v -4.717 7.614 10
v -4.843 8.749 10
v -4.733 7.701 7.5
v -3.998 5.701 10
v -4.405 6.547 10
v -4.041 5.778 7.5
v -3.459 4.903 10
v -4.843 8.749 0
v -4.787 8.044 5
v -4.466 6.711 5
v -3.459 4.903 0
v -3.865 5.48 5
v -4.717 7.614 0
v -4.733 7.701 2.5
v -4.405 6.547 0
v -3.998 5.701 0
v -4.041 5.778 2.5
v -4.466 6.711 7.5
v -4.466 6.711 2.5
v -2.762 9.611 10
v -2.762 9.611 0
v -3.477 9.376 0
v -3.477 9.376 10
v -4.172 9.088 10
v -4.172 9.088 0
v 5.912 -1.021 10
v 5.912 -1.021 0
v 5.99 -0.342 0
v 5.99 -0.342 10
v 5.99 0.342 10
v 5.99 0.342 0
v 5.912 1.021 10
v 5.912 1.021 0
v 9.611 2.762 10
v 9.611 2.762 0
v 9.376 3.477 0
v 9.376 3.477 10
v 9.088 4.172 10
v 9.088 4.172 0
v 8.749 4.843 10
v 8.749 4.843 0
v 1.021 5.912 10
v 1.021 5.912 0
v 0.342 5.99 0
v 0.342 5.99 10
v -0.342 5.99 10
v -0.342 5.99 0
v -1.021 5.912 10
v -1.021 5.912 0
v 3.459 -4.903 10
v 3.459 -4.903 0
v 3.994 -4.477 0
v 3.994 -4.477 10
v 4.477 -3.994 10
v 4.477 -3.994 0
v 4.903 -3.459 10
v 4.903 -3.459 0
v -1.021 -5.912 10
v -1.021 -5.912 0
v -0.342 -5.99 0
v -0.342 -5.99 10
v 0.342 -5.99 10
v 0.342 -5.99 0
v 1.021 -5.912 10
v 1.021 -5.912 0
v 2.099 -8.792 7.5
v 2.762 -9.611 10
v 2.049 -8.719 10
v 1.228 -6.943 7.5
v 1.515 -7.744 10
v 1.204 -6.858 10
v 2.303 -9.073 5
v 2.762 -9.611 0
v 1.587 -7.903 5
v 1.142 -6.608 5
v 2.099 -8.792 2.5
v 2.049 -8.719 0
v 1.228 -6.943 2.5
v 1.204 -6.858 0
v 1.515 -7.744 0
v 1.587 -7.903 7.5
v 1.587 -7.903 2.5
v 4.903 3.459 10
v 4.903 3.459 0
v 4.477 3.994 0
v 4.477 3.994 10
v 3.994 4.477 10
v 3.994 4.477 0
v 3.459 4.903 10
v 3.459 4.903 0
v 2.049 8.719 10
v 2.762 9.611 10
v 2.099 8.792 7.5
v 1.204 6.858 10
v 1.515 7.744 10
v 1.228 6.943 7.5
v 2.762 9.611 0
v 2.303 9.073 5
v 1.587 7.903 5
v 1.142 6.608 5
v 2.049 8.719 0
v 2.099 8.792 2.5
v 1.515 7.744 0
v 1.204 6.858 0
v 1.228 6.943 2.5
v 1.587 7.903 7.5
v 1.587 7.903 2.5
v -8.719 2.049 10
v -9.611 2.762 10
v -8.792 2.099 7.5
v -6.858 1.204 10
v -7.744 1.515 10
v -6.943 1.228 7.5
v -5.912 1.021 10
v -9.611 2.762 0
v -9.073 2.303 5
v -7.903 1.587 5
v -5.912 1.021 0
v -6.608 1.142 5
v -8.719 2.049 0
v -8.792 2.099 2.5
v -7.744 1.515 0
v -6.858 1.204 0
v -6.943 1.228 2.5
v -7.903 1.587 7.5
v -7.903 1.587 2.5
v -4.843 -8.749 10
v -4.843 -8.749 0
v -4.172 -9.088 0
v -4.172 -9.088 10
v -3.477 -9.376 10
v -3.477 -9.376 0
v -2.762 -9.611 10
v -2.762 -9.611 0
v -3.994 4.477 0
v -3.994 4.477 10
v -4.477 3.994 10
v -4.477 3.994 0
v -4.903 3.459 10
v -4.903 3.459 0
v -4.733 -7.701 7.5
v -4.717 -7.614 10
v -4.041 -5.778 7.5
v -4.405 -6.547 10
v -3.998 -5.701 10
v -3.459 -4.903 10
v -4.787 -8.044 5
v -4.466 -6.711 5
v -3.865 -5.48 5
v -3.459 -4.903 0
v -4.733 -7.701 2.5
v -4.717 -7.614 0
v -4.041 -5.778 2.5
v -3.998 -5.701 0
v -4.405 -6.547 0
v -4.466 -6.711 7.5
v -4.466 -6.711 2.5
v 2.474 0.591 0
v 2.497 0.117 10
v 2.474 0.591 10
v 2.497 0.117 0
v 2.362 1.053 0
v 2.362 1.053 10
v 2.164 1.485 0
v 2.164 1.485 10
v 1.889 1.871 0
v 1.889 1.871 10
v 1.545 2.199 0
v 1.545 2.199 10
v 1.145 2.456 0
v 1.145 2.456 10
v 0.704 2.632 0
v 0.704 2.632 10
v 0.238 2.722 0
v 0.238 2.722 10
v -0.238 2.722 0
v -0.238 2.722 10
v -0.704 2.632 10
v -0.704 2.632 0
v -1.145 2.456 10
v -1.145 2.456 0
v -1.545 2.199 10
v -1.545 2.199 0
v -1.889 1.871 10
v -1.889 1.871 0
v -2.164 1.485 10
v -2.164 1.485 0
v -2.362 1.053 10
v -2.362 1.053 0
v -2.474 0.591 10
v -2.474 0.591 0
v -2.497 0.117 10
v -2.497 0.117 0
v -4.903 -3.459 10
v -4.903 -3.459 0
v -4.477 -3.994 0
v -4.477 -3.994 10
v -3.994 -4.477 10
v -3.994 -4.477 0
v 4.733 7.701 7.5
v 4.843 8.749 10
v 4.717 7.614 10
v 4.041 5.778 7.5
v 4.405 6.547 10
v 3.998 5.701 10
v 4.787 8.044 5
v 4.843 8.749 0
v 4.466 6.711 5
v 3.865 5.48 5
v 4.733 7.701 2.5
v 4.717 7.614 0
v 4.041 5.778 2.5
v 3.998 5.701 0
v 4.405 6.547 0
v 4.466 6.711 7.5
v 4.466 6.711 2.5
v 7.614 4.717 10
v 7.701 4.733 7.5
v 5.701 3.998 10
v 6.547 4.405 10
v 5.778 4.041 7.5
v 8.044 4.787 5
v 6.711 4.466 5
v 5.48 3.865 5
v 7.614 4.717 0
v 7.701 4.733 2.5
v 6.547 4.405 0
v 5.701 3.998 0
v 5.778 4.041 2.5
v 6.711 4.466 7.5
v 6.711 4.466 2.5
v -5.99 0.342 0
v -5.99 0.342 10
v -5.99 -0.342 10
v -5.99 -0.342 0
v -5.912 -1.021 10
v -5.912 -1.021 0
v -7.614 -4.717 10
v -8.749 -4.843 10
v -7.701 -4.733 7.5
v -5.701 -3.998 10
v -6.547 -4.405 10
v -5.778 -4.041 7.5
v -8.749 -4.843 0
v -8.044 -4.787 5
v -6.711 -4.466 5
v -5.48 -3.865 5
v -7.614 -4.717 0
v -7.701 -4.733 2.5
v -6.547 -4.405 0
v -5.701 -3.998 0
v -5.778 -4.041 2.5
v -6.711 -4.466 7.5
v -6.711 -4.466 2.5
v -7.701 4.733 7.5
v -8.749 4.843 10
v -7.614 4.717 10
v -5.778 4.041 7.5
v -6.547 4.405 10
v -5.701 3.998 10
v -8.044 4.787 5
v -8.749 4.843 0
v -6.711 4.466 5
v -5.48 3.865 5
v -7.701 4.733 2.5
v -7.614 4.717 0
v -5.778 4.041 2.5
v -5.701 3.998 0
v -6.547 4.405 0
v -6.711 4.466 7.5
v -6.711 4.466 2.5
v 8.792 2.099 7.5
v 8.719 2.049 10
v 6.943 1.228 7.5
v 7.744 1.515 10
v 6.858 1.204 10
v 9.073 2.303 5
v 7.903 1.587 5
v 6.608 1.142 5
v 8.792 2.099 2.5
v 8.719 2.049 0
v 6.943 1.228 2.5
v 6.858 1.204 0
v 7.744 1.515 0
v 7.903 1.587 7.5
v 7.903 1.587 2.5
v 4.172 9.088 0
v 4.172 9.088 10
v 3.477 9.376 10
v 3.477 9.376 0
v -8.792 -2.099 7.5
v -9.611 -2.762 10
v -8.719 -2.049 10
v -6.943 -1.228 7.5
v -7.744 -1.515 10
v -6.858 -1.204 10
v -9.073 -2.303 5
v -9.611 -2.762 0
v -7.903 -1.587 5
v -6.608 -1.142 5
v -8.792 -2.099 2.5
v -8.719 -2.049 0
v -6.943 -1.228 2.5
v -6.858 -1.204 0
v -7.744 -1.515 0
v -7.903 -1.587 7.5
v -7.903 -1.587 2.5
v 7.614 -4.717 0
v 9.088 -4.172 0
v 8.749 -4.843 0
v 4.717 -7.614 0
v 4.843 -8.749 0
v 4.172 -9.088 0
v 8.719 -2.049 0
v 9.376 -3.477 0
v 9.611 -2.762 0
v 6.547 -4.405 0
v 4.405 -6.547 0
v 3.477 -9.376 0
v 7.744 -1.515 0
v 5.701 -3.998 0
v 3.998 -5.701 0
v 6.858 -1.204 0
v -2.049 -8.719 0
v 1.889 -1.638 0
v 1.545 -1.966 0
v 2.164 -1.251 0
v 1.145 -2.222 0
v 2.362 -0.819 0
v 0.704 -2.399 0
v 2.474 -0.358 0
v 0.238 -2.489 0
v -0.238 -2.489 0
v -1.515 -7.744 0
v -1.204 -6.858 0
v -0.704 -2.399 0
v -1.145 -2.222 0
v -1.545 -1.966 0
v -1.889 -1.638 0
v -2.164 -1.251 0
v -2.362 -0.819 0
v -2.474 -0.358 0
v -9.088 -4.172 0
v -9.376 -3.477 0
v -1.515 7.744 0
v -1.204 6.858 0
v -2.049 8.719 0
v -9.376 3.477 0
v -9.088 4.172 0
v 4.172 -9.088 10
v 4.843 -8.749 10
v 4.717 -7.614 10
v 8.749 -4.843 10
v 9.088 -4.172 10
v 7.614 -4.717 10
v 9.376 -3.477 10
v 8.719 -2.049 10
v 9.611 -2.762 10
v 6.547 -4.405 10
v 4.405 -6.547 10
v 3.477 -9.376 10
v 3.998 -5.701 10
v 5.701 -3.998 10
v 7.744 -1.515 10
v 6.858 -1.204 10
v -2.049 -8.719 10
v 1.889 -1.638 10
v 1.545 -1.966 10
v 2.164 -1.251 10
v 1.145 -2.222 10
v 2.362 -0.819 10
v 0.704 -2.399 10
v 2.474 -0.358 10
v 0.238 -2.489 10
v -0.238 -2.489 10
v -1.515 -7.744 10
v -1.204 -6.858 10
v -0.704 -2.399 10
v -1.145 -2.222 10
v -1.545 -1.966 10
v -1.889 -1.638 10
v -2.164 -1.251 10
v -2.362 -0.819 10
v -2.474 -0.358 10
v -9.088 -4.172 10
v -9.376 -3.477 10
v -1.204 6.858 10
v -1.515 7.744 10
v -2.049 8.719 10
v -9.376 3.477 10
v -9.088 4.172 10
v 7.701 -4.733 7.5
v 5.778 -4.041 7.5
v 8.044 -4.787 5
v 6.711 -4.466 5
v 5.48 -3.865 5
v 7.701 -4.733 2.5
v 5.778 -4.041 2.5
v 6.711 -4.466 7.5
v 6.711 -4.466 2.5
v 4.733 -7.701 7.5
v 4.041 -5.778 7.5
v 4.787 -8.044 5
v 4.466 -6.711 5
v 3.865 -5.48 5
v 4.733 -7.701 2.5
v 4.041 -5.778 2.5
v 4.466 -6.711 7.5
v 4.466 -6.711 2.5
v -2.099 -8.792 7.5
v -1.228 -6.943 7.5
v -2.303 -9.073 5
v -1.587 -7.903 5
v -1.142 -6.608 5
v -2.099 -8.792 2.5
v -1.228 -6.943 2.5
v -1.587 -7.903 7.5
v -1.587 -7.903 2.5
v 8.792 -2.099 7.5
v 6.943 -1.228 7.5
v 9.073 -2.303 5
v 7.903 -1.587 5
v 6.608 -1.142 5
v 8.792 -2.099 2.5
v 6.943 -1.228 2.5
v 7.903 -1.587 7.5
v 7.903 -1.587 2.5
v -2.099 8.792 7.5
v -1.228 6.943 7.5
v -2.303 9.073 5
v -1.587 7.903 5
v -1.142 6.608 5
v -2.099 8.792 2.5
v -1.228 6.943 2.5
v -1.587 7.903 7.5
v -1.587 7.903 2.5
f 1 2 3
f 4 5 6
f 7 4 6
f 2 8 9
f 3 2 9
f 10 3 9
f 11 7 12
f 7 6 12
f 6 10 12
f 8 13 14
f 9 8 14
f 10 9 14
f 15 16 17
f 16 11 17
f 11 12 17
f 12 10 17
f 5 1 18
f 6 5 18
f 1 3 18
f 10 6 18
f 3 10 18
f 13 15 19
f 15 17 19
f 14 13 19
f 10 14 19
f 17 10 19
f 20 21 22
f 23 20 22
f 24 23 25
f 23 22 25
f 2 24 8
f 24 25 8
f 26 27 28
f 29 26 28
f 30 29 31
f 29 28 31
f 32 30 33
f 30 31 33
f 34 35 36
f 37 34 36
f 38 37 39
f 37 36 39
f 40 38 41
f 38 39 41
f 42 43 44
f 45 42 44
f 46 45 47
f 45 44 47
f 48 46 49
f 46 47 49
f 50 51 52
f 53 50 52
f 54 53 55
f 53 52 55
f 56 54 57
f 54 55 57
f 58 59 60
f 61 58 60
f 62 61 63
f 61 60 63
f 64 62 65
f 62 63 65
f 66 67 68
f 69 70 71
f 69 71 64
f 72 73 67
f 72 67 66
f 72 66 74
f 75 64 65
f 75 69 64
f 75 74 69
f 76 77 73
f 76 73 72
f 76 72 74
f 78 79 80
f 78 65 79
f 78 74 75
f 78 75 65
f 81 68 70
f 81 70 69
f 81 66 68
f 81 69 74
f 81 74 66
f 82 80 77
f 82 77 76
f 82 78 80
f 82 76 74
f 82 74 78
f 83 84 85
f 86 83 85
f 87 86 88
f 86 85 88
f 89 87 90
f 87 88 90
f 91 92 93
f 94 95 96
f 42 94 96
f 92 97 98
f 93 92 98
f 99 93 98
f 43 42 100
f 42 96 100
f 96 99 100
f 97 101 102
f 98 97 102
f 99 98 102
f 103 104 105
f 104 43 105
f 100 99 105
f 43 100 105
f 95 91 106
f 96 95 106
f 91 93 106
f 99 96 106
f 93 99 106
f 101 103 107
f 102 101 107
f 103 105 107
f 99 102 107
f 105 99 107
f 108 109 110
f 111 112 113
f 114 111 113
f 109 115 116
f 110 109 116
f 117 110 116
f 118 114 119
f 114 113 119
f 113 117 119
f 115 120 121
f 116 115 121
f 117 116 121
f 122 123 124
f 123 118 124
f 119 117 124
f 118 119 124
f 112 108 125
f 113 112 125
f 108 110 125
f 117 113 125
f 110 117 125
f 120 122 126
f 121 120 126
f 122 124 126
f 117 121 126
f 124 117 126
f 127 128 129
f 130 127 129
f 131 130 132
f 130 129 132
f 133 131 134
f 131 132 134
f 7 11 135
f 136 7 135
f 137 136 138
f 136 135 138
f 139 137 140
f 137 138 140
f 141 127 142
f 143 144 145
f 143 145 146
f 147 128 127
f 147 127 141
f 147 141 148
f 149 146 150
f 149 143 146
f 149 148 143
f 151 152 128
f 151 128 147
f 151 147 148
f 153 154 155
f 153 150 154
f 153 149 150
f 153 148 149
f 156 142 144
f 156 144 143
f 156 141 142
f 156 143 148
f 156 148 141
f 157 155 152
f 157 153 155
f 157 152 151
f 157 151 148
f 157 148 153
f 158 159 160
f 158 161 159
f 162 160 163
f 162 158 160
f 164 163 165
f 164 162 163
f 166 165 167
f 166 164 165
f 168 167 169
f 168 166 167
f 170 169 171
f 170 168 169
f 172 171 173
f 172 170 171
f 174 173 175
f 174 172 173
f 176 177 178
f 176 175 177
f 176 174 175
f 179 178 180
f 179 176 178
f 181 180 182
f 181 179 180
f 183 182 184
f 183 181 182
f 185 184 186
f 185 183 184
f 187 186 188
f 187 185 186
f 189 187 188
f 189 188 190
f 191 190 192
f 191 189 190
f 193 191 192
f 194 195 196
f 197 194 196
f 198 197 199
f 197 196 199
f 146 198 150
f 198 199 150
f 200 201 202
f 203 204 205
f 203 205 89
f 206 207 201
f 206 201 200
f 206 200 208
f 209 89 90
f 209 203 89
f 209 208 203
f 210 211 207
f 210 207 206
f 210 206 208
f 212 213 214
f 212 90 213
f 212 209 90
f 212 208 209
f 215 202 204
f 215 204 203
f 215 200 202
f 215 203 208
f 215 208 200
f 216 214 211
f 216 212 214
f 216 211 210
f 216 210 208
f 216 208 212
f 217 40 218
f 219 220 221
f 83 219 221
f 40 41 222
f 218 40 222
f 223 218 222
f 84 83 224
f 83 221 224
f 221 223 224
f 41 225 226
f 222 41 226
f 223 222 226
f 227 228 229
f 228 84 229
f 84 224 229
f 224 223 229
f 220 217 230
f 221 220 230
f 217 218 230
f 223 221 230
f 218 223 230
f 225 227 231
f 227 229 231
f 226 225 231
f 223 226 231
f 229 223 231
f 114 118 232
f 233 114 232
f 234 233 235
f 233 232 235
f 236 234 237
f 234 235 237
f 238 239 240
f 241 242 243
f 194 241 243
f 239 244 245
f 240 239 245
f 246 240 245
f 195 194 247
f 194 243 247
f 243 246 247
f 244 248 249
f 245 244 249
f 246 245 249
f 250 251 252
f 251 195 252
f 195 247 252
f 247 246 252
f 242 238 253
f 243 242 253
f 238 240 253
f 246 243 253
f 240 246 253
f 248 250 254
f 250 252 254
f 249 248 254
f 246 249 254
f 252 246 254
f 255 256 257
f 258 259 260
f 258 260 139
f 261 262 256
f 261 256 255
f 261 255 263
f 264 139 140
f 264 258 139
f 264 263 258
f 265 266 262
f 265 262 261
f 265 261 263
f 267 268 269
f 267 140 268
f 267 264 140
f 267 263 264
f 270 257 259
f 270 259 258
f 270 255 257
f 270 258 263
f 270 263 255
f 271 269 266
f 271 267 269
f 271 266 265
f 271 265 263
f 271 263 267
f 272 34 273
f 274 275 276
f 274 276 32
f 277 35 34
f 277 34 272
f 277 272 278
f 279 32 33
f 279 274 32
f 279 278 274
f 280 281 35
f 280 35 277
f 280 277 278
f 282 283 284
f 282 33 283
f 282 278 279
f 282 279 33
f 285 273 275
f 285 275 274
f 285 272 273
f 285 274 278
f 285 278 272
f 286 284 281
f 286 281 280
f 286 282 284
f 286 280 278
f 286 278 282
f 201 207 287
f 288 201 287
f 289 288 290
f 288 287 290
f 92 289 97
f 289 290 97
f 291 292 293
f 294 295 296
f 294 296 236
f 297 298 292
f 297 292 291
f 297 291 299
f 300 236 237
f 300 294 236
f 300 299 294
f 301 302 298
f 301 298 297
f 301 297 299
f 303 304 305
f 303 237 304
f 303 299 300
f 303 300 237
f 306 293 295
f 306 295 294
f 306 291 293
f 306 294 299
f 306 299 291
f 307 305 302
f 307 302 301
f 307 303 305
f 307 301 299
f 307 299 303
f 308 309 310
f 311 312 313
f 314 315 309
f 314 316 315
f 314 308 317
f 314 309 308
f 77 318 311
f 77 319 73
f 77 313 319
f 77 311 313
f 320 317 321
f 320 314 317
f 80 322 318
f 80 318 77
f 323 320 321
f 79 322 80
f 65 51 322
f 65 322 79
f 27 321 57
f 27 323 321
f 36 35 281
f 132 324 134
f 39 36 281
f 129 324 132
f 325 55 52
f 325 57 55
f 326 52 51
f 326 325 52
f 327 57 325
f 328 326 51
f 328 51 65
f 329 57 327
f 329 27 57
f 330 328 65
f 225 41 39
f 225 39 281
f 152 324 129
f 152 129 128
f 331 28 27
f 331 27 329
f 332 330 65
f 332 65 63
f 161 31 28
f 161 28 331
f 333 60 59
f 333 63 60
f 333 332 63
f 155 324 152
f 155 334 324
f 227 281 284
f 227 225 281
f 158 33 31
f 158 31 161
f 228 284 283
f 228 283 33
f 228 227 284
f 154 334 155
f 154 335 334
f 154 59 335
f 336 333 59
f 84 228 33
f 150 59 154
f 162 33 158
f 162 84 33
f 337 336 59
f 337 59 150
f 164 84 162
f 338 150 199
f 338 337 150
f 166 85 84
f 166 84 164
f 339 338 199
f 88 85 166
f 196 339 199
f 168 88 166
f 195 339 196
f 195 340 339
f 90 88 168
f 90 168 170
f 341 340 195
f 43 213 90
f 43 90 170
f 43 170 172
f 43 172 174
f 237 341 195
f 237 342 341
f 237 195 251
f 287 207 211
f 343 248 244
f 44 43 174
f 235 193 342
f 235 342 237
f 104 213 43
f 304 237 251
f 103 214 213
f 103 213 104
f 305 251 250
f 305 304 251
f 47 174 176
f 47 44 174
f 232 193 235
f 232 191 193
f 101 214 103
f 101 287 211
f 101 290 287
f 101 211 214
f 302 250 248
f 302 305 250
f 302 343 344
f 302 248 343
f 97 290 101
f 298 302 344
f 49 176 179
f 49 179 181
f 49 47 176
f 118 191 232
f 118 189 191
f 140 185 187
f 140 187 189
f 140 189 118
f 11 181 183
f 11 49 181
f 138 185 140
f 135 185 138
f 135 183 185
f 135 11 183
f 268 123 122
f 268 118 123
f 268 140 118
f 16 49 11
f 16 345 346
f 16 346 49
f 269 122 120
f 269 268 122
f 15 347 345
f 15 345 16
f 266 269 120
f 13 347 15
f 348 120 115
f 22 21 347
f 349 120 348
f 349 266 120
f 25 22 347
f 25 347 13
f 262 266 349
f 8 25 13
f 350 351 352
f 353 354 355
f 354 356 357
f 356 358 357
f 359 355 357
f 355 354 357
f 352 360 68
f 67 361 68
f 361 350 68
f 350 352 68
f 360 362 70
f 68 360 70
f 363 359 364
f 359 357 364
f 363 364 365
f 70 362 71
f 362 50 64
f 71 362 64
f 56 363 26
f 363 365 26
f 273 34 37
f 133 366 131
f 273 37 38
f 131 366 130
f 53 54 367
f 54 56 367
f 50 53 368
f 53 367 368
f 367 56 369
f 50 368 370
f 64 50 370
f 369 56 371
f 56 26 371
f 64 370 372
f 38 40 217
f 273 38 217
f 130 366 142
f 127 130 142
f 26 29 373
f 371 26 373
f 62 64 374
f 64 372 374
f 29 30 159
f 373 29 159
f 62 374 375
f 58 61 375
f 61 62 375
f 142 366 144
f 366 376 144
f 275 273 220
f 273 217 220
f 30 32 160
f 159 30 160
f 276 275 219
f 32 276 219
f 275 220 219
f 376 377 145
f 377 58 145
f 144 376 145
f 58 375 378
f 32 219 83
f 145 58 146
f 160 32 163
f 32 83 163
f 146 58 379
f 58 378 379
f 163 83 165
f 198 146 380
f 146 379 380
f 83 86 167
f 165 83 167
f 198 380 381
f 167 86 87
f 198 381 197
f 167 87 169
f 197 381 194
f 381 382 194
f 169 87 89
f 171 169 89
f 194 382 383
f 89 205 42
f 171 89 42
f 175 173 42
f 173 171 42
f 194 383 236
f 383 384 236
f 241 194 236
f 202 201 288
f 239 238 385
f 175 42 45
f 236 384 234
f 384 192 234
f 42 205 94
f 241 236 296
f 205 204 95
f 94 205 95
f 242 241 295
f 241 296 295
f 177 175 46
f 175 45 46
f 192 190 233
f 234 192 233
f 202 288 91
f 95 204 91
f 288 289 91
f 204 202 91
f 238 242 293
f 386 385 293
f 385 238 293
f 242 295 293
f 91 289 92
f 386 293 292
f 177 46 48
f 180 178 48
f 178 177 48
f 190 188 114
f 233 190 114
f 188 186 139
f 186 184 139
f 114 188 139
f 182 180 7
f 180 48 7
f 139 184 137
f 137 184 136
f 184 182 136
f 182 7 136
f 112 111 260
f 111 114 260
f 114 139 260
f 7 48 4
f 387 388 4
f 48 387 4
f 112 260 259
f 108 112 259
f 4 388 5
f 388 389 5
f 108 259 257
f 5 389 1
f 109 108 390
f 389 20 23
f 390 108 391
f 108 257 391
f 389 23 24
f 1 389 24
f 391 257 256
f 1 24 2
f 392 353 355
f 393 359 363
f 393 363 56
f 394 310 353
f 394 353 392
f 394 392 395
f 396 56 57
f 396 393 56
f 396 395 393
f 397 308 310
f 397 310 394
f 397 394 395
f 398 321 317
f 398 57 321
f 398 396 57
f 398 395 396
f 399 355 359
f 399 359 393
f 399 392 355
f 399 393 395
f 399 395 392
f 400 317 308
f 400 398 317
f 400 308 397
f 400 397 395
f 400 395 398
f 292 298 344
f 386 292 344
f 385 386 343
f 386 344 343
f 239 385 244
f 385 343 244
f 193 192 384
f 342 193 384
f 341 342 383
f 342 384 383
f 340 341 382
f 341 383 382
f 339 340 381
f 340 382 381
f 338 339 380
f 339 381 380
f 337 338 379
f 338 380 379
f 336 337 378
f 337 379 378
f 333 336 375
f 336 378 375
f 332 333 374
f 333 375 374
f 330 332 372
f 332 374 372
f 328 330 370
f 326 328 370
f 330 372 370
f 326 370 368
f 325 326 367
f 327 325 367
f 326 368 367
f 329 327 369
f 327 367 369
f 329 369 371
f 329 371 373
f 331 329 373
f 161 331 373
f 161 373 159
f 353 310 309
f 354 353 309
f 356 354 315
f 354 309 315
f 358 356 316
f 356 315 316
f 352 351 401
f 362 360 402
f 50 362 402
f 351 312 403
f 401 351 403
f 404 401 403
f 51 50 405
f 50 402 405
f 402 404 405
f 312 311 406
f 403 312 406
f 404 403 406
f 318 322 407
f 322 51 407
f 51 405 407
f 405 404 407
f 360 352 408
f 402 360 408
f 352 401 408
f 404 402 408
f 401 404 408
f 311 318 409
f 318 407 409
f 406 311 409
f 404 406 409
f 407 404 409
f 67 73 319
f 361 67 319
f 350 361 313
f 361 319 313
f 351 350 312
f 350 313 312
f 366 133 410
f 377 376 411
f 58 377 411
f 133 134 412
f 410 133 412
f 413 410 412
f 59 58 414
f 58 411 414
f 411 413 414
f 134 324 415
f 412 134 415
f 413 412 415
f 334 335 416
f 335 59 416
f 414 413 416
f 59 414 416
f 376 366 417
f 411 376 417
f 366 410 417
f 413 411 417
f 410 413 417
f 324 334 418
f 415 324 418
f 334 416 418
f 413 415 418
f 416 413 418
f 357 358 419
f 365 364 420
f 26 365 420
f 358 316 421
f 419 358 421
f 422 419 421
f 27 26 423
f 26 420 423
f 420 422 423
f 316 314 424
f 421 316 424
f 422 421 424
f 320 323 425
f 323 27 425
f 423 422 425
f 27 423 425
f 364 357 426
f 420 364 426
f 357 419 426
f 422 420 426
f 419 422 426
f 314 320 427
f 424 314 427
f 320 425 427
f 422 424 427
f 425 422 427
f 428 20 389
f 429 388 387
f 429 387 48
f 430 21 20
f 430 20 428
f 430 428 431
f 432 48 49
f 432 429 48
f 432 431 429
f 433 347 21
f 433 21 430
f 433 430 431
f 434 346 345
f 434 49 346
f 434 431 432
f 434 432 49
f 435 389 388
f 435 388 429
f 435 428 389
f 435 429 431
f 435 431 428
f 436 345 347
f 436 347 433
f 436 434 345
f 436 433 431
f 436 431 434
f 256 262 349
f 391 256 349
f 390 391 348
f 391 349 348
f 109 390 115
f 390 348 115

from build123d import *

# Parameters (mm, degrees)
SKETCH1_R           = 2.5
BOSS_EXTRUDE2_DEPTH = 10
CUT_EXTRUDE1_REACH  = 18.874
SKETCH2_R           = 2.5


with BuildPart() as part:
    # Sketch1 → Boss-Extrude2 (new body)
    with BuildSketch(Plane.XY):
        with BuildLine():
            add(Edge.make_bspline(
                [(9.610904716, 2.762337877), (8.044691719, 1.282669722), (5.912491895, 1.020999313)],
                knots=[0, 0, 0, 1, 1, 1], degree=2))
            ThreePointArc((9.610904716, 2.762337877), (9.238795325, 3.826834324), (8.749203742, 4.842668053))
            add(Edge.make_bspline(
                [(8.749203742, 4.842668053), (6.595440526, 4.781471609), (4.90271865, 3.458807575)],
                knots=[0, 0, 0, 1, 1, 1], degree=2))
            ThreePointArc((4.90271865, 3.458807575), (4.242640687, 4.242640687), (3.458807575, 4.90271865))
            add(Edge.make_bspline(
                [(4.842668053, 8.749203742), (4.781471609, 6.595440526), (3.458807575, 4.90271865)],
                knots=[0, 0, 0, 1, 1, 1], degree=2))
            ThreePointArc((4.842668053, 8.749203742), (3.826834324, 9.238795325), (2.762337877, 9.610904716))
            add(Edge.make_bspline(
                [(2.762337877, 9.610904716), (1.282669722, 8.044691719), (1.020999313, 5.912491895)],
                knots=[0, 0, 0, 1, 1, 1], degree=2))
            ThreePointArc((1.020999313, 5.912491895), (0, 6), (-1.020999313, 5.912491895))
            add(Edge.make_bspline(
                [(-2.762337877, 9.610904716), (-1.282669722, 8.044691719), (-1.020999313, 5.912491895)],
                knots=[0, 0, 0, 1, 1, 1], degree=2))
            ThreePointArc((-2.762337877, 9.610904716), (-3.826834324, 9.238795325), (-4.842668053, 8.749203742))
            add(Edge.make_bspline(
                [(-4.842668053, 8.749203742), (-4.781471609, 6.595440526), (-3.458807575, 4.90271865)],
                knots=[0, 0, 0, 1, 1, 1], degree=2))
            ThreePointArc((-3.458807575, 4.90271865), (-4.242640687, 4.242640687), (-4.90271865, 3.458807575))
            add(Edge.make_bspline(
                [(-8.749203742, 4.842668053), (-6.595440526, 4.781471609), (-4.90271865, 3.458807575)],
                knots=[0, 0, 0, 1, 1, 1], degree=2))
            ThreePointArc((-8.749203742, 4.842668053), (-9.238795325, 3.826834324), (-9.610904716, 2.762337877))
            add(Edge.make_bspline(
                [(-9.610904716, 2.762337877), (-8.044691719, 1.282669722), (-5.912491895, 1.020999313)],
                knots=[0, 0, 0, 1, 1, 1], degree=2))
            ThreePointArc((-5.912491895, 1.020999313), (-6, 0), (-5.912491895, -1.020999313))
            add(Edge.make_bspline(
                [(-9.610904716, -2.762337877), (-8.044691719, -1.282669722), (-5.912491895, -1.020999313)],
                knots=[0, 0, 0, 1, 1, 1], degree=2))
            ThreePointArc((-9.610904716, -2.762337877), (-9.238795325, -3.826834324), (-8.749203742, -4.842668053))
            add(Edge.make_bspline(
                [(-8.749203742, -4.842668053), (-6.595440526, -4.781471609), (-4.90271865, -3.458807575)],
                knots=[0, 0, 0, 1, 1, 1], degree=2))
            ThreePointArc((-4.90271865, -3.458807575), (-4.242640687, -4.242640687), (-3.458807575, -4.90271865))
            add(Edge.make_bspline(
                [(-4.842668053, -8.749203742), (-4.781471609, -6.595440526), (-3.458807575, -4.90271865)],
                knots=[0, 0, 0, 1, 1, 1], degree=2))
            ThreePointArc((-4.842668053, -8.749203742), (-3.826834324, -9.238795325), (-2.762337877, -9.610904716))
            add(Edge.make_bspline(
                [(-2.762337877, -9.610904716), (-1.282669722, -8.044691719), (-1.020999313, -5.912491895)],
                knots=[0, 0, 0, 1, 1, 1], degree=2))
            ThreePointArc((-1.020999313, -5.912491895), (0, -6), (1.020999313, -5.912491895))
            add(Edge.make_bspline(
                [(2.762337877, -9.610904716), (1.282669722, -8.044691719), (1.020999313, -5.912491895)],
                knots=[0, 0, 0, 1, 1, 1], degree=2))
            ThreePointArc((2.762337877, -9.610904716), (3.826834324, -9.238795325), (4.842668053, -8.749203742))
            add(Edge.make_bspline(
                [(4.842668053, -8.749203742), (4.781471609, -6.595440526), (3.458807575, -4.90271865)],
                knots=[0, 0, 0, 1, 1, 1], degree=2))
            ThreePointArc((3.458807575, -4.90271865), (4.242640687, -4.242640687), (4.90271865, -3.458807575))
            add(Edge.make_bspline(
                [(8.749203742, -4.842668053), (6.595440526, -4.781471609), (4.90271865, -3.458807575)],
                knots=[0, 0, 0, 1, 1, 1], degree=2))
            ThreePointArc((8.749203742, -4.842668053), (9.238795325, -3.826834324), (9.610904716, -2.762337877))
            add(Edge.make_bspline(
                [(9.610904716, -2.762337877), (8.044691719, -1.282669722), (5.912491895, -1.020999313)],
                knots=[0, 0, 0, 1, 1, 1], degree=2))
            ThreePointArc((5.912491895, -1.020999313), (6, 0), (5.912491895, 1.020999313))
        make_face()
        with Locations((0, 0.23341784)):
            Circle(SKETCH1_R, mode=Mode.SUBTRACT)
    extrude(amount=BOSS_EXTRUDE2_DEPTH)

    # Sketch2 → Cut-Extrude1 (cut, up to next)
    with BuildSketch(Plane.XY.offset(10), mode=Mode.PRIVATE) as cut_extrude1_sk1:
        Circle(SKETCH2_R)
    cut_extrude1_tool1 = extrude(cut_extrude1_sk1.sketch, amount=-CUT_EXTRUDE1_REACH, mode=Mode.PRIVATE) & part.part
    add(cut_extrude1_tool1.solids().sort_by_distance((0, 0, 10))[0], mode=Mode.SUBTRACT)


solid = part.part
